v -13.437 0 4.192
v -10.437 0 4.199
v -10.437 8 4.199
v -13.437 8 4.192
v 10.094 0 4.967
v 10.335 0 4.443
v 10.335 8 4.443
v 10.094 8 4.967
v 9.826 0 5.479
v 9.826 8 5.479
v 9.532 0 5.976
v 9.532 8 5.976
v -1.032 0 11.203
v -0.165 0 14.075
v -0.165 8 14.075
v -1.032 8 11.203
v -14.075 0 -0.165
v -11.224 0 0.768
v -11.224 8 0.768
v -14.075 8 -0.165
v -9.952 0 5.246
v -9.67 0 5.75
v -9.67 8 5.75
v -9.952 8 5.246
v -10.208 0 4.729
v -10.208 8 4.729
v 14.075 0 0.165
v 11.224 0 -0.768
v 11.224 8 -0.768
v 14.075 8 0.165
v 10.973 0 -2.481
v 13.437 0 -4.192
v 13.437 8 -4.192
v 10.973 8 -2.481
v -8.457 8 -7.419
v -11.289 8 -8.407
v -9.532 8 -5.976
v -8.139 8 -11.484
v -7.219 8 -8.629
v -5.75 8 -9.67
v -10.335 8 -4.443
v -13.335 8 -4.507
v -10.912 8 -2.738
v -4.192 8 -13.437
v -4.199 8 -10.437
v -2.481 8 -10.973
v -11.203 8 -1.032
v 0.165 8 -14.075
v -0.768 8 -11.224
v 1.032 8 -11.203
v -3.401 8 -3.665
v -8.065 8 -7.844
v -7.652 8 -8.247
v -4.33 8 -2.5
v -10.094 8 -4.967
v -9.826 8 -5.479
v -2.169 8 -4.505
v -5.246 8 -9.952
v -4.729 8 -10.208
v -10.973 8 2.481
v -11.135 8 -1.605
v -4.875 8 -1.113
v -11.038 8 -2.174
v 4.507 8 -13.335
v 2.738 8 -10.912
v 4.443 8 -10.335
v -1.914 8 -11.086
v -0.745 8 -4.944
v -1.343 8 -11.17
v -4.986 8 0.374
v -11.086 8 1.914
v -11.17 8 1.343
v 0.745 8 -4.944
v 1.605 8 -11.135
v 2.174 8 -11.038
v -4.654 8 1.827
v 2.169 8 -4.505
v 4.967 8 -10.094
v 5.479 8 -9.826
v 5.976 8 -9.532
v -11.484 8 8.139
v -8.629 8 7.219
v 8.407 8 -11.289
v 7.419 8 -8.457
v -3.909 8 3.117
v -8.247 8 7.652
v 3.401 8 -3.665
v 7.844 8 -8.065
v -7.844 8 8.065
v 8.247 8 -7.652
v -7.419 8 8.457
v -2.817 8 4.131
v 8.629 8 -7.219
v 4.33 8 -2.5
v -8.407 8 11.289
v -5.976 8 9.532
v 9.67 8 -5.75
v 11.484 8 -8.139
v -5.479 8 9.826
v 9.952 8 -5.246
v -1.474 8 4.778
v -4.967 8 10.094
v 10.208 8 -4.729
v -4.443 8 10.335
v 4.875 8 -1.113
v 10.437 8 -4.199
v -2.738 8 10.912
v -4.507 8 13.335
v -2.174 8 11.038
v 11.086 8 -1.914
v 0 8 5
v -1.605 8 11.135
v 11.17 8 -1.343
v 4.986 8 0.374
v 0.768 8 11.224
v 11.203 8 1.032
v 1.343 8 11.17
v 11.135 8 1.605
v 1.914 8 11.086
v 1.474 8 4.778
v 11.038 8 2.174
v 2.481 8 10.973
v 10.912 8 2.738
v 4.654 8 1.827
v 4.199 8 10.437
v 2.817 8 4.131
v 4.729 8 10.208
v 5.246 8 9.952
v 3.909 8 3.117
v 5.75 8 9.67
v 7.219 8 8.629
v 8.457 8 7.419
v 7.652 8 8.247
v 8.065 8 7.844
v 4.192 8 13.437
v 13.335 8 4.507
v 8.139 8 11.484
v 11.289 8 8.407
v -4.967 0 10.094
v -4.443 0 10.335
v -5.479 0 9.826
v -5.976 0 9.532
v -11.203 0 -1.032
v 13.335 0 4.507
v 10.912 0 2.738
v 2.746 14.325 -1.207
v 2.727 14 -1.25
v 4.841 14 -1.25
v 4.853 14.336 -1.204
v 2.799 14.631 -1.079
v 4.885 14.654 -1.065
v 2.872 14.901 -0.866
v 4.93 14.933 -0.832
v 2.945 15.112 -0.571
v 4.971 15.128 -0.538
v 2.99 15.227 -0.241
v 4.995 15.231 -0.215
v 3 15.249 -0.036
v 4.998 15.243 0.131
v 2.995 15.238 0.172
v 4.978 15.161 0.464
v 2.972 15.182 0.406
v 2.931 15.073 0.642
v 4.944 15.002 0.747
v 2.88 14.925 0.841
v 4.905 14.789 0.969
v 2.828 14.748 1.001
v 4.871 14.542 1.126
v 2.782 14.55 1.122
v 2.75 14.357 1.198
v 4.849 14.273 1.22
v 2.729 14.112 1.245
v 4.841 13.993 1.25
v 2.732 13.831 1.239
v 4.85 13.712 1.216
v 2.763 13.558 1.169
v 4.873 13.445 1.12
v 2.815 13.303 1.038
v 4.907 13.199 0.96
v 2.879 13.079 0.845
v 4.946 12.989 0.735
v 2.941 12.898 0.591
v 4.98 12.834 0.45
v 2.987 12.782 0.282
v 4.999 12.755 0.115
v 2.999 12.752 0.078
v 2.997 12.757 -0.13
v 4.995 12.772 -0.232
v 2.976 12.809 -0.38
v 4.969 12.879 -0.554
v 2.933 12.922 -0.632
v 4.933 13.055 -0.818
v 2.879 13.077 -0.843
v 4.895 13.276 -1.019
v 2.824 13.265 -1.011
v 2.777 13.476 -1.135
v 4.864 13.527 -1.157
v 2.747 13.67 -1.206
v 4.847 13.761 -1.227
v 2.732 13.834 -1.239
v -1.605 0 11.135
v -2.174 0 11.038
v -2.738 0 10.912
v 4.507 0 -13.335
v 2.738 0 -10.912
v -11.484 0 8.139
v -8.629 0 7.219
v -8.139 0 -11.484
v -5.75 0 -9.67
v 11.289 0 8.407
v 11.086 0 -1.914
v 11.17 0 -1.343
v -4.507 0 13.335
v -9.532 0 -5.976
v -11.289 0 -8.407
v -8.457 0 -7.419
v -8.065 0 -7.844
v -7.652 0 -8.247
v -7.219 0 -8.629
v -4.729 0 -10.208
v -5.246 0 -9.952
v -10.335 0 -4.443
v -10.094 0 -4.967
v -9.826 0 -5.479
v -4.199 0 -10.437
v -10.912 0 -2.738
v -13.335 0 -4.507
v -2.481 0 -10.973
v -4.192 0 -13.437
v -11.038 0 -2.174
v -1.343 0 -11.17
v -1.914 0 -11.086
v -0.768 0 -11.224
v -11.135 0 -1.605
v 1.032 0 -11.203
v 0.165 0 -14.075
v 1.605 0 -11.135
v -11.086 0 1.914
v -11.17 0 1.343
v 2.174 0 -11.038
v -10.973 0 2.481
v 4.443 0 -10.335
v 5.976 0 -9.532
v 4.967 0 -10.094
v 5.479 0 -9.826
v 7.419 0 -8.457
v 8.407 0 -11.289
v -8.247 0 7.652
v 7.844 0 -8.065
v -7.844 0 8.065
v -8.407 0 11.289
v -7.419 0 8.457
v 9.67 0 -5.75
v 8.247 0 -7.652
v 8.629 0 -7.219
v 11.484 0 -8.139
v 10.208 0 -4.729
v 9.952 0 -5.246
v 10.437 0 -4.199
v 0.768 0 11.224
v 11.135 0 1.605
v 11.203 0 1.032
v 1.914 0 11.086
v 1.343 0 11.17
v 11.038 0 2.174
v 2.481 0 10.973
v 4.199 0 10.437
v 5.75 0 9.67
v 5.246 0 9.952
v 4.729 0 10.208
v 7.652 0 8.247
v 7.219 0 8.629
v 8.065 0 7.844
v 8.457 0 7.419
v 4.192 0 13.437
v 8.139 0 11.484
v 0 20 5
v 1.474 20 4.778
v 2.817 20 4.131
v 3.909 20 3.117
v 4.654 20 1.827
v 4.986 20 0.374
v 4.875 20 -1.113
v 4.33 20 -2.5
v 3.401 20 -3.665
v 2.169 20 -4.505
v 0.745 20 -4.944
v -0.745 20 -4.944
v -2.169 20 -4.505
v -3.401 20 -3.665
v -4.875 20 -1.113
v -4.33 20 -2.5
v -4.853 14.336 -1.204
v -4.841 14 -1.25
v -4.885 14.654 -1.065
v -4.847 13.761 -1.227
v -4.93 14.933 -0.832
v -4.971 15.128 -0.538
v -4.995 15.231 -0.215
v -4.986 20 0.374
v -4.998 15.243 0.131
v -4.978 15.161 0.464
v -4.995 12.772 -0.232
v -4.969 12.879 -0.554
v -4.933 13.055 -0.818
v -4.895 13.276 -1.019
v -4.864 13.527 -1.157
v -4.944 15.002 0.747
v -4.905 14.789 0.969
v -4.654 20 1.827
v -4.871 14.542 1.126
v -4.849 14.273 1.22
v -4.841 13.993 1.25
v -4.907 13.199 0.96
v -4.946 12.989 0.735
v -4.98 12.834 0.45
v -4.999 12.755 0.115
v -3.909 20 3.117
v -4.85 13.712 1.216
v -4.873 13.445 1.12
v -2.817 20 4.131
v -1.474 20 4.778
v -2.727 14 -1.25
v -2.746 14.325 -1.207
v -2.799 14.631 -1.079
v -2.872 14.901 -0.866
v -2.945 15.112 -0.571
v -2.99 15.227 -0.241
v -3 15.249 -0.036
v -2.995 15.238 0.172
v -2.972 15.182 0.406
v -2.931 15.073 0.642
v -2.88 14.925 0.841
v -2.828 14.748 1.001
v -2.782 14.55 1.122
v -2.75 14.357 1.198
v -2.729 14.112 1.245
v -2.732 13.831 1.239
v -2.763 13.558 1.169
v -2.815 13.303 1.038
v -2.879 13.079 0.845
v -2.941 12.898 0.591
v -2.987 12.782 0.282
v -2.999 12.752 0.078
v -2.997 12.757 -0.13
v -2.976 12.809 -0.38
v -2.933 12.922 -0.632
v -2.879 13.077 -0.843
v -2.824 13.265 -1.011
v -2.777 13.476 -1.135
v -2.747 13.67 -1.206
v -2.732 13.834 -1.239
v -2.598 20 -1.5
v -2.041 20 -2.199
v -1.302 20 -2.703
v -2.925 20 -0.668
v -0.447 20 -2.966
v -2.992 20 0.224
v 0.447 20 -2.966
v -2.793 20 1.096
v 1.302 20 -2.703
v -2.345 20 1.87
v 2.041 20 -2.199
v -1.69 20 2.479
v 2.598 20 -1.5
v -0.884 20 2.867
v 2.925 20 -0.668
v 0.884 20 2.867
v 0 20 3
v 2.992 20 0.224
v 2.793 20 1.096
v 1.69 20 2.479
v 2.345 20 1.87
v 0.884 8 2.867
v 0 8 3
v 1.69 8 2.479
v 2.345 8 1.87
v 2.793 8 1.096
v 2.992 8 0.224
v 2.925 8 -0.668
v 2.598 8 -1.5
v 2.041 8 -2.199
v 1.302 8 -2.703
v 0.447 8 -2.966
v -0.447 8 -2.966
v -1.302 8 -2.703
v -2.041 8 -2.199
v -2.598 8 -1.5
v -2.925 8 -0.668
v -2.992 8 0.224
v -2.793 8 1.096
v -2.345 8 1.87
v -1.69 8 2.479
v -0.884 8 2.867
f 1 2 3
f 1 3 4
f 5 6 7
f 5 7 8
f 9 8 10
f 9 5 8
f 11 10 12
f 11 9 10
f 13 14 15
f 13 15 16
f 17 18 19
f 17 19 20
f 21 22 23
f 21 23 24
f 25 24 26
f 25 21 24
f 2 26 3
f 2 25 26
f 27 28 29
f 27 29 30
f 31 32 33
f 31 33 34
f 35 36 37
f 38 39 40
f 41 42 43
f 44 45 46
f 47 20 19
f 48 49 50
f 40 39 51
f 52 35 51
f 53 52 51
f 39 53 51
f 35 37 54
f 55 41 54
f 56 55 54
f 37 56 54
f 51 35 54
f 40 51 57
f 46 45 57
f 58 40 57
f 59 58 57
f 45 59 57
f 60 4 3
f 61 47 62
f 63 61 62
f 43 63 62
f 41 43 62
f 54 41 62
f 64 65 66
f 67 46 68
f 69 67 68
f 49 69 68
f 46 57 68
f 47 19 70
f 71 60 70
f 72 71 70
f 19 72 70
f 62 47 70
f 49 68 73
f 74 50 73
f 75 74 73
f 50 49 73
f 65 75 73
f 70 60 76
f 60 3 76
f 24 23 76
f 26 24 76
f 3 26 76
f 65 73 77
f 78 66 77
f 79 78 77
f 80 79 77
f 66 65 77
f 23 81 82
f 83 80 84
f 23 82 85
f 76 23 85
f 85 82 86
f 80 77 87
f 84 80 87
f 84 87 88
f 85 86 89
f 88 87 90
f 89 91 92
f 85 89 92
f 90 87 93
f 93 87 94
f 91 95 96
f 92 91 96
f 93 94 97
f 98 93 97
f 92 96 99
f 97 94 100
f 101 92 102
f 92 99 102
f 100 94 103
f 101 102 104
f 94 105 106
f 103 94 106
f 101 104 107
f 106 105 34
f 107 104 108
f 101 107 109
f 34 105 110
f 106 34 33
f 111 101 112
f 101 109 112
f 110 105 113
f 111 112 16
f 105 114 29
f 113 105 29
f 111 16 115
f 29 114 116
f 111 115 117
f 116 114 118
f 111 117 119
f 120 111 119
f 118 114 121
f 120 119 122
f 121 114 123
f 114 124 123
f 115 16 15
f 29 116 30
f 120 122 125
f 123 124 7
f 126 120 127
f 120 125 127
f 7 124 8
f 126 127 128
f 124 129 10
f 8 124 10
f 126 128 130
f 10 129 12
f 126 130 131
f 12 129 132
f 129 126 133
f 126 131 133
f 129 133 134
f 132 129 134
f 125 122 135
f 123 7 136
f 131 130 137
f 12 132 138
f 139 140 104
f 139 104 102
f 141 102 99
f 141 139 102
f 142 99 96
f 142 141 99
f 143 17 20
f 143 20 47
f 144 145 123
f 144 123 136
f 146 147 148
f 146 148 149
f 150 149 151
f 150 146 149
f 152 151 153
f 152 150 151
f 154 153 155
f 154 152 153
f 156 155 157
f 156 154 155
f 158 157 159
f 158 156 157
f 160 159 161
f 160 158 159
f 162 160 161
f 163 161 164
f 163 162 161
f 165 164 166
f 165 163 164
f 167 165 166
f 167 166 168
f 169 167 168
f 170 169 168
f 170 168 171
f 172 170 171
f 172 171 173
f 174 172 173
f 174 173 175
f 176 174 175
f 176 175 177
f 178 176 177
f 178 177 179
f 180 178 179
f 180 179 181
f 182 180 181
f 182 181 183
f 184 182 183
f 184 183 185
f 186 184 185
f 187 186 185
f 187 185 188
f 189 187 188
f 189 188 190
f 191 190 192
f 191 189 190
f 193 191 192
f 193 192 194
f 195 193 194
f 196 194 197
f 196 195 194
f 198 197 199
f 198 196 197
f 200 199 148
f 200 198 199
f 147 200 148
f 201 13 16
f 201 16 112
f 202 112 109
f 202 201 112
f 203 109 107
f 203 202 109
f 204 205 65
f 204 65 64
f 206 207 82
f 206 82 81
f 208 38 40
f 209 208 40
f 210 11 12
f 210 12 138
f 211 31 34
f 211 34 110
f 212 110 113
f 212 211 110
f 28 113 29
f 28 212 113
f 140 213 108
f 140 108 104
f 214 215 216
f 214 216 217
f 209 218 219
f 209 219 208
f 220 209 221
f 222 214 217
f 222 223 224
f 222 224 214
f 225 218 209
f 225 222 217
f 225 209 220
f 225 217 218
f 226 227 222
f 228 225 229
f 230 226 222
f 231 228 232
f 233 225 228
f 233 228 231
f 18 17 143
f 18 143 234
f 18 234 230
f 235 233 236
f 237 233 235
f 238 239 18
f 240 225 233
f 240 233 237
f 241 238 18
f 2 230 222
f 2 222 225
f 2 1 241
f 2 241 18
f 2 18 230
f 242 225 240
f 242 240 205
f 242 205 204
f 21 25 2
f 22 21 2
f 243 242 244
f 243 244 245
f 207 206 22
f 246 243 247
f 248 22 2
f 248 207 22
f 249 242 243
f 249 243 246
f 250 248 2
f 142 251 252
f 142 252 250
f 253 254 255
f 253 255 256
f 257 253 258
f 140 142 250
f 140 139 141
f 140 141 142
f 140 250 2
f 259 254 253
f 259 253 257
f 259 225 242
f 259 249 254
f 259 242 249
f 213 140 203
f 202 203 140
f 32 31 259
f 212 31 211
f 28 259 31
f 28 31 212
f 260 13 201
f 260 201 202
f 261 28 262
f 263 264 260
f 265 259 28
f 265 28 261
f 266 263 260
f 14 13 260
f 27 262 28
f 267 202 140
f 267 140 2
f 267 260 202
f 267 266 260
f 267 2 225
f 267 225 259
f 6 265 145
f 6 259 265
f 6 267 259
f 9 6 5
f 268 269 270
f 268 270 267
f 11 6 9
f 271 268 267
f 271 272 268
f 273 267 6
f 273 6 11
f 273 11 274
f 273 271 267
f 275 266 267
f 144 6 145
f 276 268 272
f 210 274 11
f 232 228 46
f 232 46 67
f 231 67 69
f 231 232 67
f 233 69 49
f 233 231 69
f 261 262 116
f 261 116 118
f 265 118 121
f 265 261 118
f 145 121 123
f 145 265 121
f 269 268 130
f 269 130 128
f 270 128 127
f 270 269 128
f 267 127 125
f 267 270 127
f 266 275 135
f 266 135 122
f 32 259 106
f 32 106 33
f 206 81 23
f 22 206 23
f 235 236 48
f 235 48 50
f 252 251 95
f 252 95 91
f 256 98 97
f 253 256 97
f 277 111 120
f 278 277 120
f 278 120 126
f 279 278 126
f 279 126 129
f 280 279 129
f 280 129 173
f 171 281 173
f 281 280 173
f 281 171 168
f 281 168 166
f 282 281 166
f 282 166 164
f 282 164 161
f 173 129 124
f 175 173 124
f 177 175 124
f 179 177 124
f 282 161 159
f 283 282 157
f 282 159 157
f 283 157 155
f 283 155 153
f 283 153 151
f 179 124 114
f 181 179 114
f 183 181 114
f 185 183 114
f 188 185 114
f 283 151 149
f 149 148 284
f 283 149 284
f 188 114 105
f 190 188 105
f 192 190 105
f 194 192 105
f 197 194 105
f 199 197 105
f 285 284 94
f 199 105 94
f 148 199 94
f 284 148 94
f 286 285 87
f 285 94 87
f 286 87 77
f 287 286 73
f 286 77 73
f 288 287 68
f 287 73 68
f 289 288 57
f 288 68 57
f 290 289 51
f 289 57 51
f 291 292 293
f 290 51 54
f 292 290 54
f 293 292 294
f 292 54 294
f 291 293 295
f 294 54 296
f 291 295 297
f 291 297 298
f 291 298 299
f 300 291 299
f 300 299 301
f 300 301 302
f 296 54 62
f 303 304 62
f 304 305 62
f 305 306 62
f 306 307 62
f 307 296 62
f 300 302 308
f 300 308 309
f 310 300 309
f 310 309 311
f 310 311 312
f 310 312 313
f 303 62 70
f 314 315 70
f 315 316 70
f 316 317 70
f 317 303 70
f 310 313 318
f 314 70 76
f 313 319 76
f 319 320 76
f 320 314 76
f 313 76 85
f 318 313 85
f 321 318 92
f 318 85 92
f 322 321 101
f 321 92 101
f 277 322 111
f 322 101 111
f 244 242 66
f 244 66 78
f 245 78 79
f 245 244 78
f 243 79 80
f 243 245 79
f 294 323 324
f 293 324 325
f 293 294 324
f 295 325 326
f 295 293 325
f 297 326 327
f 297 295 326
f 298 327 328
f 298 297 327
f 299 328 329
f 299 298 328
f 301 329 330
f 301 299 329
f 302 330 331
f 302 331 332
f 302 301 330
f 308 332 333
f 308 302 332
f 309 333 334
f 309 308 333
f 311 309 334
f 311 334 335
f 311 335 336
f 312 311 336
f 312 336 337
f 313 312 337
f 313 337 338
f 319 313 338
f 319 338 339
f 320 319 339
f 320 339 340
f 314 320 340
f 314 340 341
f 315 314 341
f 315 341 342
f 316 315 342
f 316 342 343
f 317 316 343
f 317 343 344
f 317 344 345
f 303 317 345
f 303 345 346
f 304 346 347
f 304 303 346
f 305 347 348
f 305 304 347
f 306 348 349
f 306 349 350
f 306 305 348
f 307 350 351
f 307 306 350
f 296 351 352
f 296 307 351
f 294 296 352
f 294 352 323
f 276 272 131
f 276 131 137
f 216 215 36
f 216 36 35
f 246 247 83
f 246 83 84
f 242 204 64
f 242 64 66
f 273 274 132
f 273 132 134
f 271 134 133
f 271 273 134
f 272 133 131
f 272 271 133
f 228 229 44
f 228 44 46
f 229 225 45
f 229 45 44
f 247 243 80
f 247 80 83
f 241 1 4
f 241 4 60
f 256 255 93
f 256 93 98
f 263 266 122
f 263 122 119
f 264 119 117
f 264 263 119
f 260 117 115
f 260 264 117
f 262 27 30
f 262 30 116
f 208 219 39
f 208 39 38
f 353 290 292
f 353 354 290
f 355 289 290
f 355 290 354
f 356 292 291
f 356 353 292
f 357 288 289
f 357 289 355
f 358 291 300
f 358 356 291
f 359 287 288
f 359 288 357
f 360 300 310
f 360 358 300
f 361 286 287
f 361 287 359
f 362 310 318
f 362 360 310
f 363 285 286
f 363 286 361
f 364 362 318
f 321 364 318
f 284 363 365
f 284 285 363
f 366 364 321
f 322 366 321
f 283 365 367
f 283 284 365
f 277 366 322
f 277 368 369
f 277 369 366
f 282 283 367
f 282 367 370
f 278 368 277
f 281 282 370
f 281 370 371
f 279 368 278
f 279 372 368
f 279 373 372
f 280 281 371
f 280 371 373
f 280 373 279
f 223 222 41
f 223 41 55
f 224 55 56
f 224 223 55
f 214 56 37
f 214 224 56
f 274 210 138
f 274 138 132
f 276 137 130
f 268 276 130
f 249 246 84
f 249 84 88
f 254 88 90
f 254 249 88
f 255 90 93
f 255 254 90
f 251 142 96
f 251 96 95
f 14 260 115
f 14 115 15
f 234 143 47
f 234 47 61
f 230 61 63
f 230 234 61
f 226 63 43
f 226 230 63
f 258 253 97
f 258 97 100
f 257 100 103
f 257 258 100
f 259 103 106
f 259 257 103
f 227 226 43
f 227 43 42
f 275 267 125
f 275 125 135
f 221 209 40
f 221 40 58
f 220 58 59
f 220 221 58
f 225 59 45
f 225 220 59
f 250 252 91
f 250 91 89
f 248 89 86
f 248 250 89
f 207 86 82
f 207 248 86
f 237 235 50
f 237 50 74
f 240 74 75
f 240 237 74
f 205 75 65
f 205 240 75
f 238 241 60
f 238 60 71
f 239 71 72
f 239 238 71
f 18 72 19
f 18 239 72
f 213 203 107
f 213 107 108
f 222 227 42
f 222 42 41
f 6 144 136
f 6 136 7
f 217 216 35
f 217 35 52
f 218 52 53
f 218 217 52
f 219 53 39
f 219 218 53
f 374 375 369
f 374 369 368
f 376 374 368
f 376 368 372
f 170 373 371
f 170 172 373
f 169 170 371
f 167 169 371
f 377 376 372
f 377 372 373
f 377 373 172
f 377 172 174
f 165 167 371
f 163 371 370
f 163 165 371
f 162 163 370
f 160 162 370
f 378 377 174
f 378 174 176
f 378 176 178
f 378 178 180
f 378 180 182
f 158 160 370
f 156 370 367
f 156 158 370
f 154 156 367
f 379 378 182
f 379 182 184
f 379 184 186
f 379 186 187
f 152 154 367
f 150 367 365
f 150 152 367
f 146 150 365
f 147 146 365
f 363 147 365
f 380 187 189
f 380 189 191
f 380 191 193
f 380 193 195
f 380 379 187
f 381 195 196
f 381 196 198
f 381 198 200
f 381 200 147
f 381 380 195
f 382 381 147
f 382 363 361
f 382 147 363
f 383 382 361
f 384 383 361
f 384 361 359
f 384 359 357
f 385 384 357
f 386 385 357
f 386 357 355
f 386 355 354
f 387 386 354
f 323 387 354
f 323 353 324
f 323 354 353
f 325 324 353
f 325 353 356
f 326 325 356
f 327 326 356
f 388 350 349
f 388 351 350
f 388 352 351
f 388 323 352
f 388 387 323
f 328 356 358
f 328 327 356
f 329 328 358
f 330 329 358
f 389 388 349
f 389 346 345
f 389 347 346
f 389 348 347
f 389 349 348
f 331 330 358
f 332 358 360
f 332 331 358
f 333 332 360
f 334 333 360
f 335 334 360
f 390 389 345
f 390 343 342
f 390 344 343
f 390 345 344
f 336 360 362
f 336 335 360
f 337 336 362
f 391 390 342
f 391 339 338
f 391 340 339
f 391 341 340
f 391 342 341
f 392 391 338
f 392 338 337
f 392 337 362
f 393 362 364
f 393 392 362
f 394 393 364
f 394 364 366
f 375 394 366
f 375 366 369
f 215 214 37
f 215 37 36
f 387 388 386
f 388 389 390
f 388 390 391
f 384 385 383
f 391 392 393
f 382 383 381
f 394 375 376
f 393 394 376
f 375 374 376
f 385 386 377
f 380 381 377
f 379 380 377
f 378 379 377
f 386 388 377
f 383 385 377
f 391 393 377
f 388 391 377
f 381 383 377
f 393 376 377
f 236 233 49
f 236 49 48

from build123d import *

# Parameters (mm, degrees)
SKETCH2_R               = 5
SKETCH2_R_2             = 3
BOSS_EXTRUDE1_DEPTH     = 20
CUT_EXTRUDE1_DEPTH      = 22.213203436
CUT_EXTRUDE1_DEPTH_BACK = 22.213203436
SKETCH3_R               = 1.25
BOSS_EXTRUDE2_DEPTH     = 8


with BuildPart() as part:
    # Sketch2 → Boss-Extrude1 (new body)
    with BuildSketch(Plane(origin=(0, 0, 0), x_dir=(1, 0, 0), z_dir=(0, 1, 0))):
        with Locations(Location((0, 0, 0), (0, 0, 270))):
            Circle(SKETCH2_R)
        with Locations(Location((0, 0, 0), (0, 0, 270))):
            Circle(SKETCH2_R_2, mode=Mode.SUBTRACT)
    extrude(amount=BOSS_EXTRUDE1_DEPTH)

    # Sketch3 → Cut-Extrude1 (cut, two sides: drawn at the far end of the back side and taken through both)
    with BuildSketch(Plane(origin=(0, 0, 0), x_dir=(0, 0, -1), z_dir=(1, 0, 0)).offset(-CUT_EXTRUDE1_DEPTH_BACK)):
        with Locations((0, 14)):
            Circle(SKETCH3_R)
    extrude(amount=CUT_EXTRUDE1_DEPTH + CUT_EXTRUDE1_DEPTH_BACK, mode=Mode.SUBTRACT)

    # Sketch4 → Boss-Extrude2 (add)
    with BuildSketch(Plane.XZ):
        with BuildLine():
            Line((11.223747146, -0.768114575), (14.074787242, 0.165464759))
            Line((14.074787242, 0.165464759), (11.202587609, 1.031761053))
            ThreePointArc((11.202587609, 1.031761053), (11.090038067, 1.890385058), (10.911778318, 2.737808237))
            Line((10.911778318, 2.737808237), (13.334786699, 4.506714787))
            Line((13.334786699, 4.506714787), (10.335462245, 4.443053024))
            ThreePointArc((10.335462245, 4.443053024), (9.963091861, 5.224873259), (9.531688601, 5.975735303))
            Line((9.531688601, 5.975735303), (11.289484326, 8.406816172))
            Line((11.289484326, 8.406816172), (8.456629826, 7.41942801))
            ThreePointArc((8.456629826, 7.41942801), (7.860888806, 8.047914461), (7.218570793, 8.628715763))
            Line((7.218570793, 8.628715763), (8.139088568, 11.483999816))
            Line((8.139088568, 11.483999816), (5.750003558, 9.669537687))
            ThreePointArc((5.750003558, 9.669537687), (4.989207185, 10.083169723), (4.19884898, 10.437057403))
            Line((4.19884898, 10.437057403), (4.191982112, 13.437049544))
            Line((4.191982112, 13.437049544), (2.48052688, 10.973125644))
            ThreePointArc((2.48052688, 10.973125644), (1.629147203, 11.131414079), (0.768114575, 11.223747146))
            Line((0.768114575, 11.223747146), (-0.165464759, 14.074787242))
            Line((-0.165464759, 14.074787242), (-1.031761053, 11.202587609))
            ThreePointArc((-1.031761053, 11.202587609), (-1.890385058, 11.090038067), (-2.737808237, 10.911778318))
            Line((-2.737808237, 10.911778318), (-4.506714787, 13.334786699))
            Line((-4.506714787, 13.334786699), (-4.443053024, 10.335462245))
            ThreePointArc((-4.443053024, 10.335462245), (-5.224873259, 9.963091861), (-5.975735303, 9.531688601))
            Line((-5.975735303, 9.531688601), (-8.406816172, 11.289484326))
            Line((-8.406816172, 11.289484326), (-7.41942801, 8.456629826))
            ThreePointArc((-7.41942801, 8.456629826), (-8.047914461, 7.860888806), (-8.628715763, 7.218570793))
            Line((-8.628715763, 7.218570793), (-11.483999816, 8.139088568))
            Line((-11.483999816, 8.139088568), (-9.669537687, 5.750003558))
            ThreePointArc((-9.669537687, 5.750003558), (-10.083169723, 4.989207185), (-10.437057403, 4.19884898))
            Line((-10.437057403, 4.19884898), (-13.437049544, 4.191982112))
            Line((-13.437049544, 4.191982112), (-10.973125644, 2.48052688))
            ThreePointArc((-10.973125644, 2.48052688), (-11.131414079, 1.629147203), (-11.223747146, 0.768114575))
            Line((-11.223747146, 0.768114575), (-14.074787242, -0.165464759))
            Line((-14.074787242, -0.165464759), (-11.202587609, -1.031761053))
            ThreePointArc((-11.202587609, -1.031761053), (-11.090038067, -1.890385058), (-10.911778318, -2.737808237))
            Line((-10.911778318, -2.737808237), (-13.334786699, -4.506714787))
            Line((-13.334786699, -4.506714787), (-10.335462245, -4.443053024))
            ThreePointArc((-10.335462245, -4.443053024), (-9.963091861, -5.224873259), (-9.531688601, -5.975735303))
            Line((-9.531688601, -5.975735303), (-11.289484326, -8.406816172))
            Line((-11.289484326, -8.406816172), (-8.456629826, -7.41942801))
            ThreePointArc((-8.456629826, -7.41942801), (-7.860888806, -8.047914461), (-7.218570793, -8.628715763))
            Line((-7.218570793, -8.628715763), (-8.139088568, -11.483999816))
            Line((-8.139088568, -11.483999816), (-5.750003558, -9.669537687))
            ThreePointArc((-5.750003558, -9.669537687), (-4.989207185, -10.083169723), (-4.19884898, -10.437057403))
            Line((-4.19884898, -10.437057403), (-4.191982112, -13.437049544))
            Line((-4.191982112, -13.437049544), (-2.48052688, -10.973125644))
            ThreePointArc((-2.48052688, -10.973125644), (-1.629147203, -11.131414079), (-0.768114575, -11.223747146))
            Line((-0.768114575, -11.223747146), (0.165464759, -14.074787242))
            Line((0.165464759, -14.074787242), (1.031761053, -11.202587609))
            ThreePointArc((1.031761053, -11.202587609), (1.890385058, -11.090038067), (2.737808237, -10.911778318))
            Line((2.737808237, -10.911778318), (4.506714787, -13.334786699))
            Line((4.506714787, -13.334786699), (4.443053024, -10.335462245))
            ThreePointArc((4.443053024, -10.335462245), (5.224873259, -9.963091861), (5.975735303, -9.531688601))
            Line((5.975735303, -9.531688601), (8.406816172, -11.289484326))
            Line((8.406816172, -11.289484326), (7.41942801, -8.456629826))
            ThreePointArc((7.41942801, -8.456629826), (8.047914461, -7.860888806), (8.628715763, -7.218570793))
            Line((8.628715763, -7.218570793), (11.483999816, -8.139088568))
            Line((11.483999816, -8.139088568), (9.669537687, -5.750003558))
            ThreePointArc((9.669537687, -5.750003558), (10.083169723, -4.989207185), (10.437057403, -4.19884898))
            Line((10.437057403, -4.19884898), (13.437049544, -4.191982112))
            Line((13.437049544, -4.191982112), (10.973125644, -2.48052688))
            ThreePointArc((10.973125644, -2.48052688), (11.131414079, -1.629147203), (11.223747146, -0.768114575))
        make_face()
    extrude(amount=-BOSS_EXTRUDE2_DEPTH)


solid = part.part
